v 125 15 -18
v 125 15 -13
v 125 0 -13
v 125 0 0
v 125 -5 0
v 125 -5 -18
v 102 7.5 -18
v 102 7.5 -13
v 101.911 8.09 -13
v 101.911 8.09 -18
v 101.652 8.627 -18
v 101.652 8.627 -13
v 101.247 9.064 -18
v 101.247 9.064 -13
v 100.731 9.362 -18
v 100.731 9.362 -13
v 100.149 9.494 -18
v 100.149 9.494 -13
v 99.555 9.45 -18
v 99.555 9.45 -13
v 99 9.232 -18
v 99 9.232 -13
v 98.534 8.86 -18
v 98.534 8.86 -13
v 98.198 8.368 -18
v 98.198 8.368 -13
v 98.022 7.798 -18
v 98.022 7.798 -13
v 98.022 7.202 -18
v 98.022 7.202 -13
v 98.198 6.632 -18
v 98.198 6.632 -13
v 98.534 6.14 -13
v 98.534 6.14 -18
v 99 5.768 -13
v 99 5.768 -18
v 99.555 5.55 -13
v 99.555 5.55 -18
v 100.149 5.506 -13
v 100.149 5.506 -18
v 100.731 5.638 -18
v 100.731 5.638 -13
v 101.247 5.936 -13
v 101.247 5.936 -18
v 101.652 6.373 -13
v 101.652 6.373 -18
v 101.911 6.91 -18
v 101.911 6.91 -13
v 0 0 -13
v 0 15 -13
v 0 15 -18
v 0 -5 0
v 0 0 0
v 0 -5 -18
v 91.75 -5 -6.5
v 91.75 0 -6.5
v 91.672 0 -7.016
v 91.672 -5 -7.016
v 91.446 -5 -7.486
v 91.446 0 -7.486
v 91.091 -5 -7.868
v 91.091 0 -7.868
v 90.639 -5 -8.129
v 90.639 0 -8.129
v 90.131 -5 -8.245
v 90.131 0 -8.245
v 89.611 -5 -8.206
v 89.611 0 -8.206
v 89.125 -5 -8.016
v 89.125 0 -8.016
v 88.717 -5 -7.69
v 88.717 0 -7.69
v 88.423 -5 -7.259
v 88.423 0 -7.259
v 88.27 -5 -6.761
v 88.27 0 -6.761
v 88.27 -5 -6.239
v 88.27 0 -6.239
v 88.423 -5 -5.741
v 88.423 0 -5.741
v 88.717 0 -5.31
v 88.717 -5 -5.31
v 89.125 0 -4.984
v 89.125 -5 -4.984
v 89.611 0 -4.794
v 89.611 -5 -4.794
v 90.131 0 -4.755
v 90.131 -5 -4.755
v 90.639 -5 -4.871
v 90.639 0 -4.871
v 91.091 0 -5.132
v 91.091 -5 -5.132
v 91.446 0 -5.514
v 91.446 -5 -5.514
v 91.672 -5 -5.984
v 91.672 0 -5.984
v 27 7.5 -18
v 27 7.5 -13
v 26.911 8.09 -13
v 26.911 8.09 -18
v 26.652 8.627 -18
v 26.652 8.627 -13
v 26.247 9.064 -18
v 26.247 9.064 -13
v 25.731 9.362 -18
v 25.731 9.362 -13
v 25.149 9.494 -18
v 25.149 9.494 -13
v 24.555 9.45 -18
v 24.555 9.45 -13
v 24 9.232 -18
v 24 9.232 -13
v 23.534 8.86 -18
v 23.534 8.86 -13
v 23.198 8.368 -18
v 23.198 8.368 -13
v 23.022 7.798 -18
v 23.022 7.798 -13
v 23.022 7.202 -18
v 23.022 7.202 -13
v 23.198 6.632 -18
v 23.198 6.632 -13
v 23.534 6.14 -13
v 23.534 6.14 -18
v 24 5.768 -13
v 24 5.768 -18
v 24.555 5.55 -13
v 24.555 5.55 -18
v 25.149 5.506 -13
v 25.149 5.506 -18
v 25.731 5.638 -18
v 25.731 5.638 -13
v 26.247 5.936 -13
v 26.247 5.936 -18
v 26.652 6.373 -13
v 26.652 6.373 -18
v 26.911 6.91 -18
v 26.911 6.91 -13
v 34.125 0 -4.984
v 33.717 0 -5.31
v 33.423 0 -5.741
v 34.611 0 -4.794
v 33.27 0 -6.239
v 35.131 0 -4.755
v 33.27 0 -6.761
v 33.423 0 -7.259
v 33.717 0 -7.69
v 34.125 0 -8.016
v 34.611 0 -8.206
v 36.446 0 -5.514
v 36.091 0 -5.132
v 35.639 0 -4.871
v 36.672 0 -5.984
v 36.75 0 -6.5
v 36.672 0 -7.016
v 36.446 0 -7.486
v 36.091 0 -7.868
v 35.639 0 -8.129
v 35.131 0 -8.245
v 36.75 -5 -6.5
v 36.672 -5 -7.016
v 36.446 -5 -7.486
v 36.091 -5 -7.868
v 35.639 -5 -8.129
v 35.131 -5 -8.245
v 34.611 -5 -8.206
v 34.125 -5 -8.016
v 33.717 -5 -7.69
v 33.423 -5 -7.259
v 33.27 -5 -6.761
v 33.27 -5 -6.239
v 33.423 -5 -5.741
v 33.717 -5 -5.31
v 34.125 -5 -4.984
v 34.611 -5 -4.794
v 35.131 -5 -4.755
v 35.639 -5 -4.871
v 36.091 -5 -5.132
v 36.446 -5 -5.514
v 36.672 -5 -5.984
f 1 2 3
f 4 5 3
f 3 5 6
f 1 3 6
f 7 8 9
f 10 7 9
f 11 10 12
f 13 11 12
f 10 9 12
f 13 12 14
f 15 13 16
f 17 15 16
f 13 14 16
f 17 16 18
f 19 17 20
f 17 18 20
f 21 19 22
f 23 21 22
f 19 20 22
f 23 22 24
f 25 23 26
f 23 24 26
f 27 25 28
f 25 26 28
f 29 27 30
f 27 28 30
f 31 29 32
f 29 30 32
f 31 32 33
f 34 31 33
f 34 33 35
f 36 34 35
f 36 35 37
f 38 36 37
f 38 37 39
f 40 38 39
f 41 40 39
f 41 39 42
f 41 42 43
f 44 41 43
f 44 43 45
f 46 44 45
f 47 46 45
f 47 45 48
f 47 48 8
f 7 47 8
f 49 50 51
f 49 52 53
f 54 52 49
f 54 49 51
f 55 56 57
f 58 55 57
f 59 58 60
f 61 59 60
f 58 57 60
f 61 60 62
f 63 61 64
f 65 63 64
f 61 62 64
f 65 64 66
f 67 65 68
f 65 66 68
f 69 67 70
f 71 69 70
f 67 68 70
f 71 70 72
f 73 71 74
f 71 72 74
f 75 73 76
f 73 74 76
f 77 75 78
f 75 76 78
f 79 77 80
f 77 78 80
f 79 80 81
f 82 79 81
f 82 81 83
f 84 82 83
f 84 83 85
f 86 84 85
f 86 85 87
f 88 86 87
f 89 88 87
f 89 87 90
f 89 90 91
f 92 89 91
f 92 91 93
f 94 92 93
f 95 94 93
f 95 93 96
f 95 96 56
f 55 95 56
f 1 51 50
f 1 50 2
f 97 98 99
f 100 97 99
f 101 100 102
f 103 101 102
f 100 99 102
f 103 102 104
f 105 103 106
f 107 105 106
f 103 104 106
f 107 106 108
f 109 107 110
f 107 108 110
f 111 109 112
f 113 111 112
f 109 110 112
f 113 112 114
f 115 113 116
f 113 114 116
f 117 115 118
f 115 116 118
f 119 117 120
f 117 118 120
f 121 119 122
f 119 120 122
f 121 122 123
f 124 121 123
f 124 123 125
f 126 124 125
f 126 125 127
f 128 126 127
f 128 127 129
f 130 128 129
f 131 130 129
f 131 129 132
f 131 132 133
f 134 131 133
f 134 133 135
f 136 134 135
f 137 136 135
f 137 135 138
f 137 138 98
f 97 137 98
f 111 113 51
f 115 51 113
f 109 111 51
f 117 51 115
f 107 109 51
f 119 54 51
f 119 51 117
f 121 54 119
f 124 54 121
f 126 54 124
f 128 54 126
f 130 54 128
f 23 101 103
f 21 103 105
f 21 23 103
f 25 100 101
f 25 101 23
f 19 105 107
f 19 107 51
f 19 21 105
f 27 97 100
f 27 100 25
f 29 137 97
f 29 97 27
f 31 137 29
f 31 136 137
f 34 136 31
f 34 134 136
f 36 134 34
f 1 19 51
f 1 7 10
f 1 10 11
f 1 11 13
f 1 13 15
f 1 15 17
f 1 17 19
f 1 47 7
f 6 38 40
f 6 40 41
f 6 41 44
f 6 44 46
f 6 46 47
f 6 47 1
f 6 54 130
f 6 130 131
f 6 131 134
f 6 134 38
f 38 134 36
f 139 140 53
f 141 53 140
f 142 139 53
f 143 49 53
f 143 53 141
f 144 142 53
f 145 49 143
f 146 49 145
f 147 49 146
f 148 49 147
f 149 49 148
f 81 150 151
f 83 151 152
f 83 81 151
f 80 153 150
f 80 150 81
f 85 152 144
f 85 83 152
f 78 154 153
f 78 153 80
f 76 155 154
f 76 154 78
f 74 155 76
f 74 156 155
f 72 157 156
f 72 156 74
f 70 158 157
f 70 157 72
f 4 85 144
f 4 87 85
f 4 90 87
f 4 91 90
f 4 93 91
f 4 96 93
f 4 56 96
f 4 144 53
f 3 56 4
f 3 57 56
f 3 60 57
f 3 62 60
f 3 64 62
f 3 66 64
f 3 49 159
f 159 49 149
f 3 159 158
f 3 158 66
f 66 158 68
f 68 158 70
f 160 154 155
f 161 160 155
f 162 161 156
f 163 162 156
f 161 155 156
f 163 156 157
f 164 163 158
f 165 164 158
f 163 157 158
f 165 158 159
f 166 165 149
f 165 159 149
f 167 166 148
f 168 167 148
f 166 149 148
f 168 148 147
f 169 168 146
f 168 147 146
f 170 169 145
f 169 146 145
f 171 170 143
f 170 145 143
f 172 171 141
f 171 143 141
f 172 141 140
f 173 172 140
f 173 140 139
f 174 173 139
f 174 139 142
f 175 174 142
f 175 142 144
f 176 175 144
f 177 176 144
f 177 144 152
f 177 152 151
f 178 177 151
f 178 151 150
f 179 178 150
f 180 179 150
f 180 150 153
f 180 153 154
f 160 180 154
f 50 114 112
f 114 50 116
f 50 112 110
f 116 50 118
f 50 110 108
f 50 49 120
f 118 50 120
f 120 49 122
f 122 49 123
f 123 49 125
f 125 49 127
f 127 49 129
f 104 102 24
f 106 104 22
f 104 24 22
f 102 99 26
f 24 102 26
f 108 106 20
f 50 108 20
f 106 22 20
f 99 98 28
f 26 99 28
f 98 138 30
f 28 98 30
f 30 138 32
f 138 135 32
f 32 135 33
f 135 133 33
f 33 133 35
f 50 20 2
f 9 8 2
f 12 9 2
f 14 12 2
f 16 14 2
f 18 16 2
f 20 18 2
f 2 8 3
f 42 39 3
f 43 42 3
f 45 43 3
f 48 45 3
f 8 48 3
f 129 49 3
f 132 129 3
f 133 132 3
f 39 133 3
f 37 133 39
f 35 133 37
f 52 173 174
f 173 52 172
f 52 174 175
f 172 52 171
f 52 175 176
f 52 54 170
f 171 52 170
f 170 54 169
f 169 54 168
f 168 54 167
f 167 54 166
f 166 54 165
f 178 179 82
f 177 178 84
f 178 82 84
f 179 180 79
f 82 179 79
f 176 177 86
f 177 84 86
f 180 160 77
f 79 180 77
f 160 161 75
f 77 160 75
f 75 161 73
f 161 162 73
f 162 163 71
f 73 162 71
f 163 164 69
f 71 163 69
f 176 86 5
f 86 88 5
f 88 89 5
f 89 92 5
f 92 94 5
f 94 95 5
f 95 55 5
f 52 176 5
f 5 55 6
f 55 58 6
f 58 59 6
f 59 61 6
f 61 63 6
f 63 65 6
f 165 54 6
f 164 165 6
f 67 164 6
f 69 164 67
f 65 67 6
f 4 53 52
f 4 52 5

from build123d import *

# Parameters (mm, degrees)
SKETCH1_W           = 125
SKETCH1_H           = 18
BOSS_EXTRUDE1_DEPTH = 5
SKETCH3_W           = 125
SKETCH3_H           = 5
BOSS_EXTRUDE2_DEPTH = 15
SKETCH5_R           = 2
CUT_EXTRUDE1_DEPTH  = 6
SKETCH6_R           = 1.75
CUT_EXTRUDE2_DEPTH  = 6


with BuildPart() as part:
    # Sketch1 → Boss-Extrude1 (new body)
    with BuildSketch(Plane(origin=(0, 0, 0), x_dir=(1, 0, 0), z_dir=(0, 1, 0))):
        with Locations((62.5, 9)):
            Rectangle(SKETCH1_W, SKETCH1_H)
    extrude(amount=-BOSS_EXTRUDE1_DEPTH)

    # Sketch3 → Boss-Extrude2 (add)
    with BuildSketch(Plane(origin=(0, 0, 0), x_dir=(1, 0, 0), z_dir=(0, 1, 0))):
        with Locations((62.5, 15.5)):
            Rectangle(SKETCH3_W, SKETCH3_H)
    extrude(amount=BOSS_EXTRUDE2_DEPTH)

    # Sketch5 → Cut-Extrude1 (cut, through all)
    with BuildSketch(Plane.XY.offset(-13)):
        with Locations((25, 7.5)):
            Circle(SKETCH5_R)
        with Locations((100, 7.5)):
            Circle(SKETCH5_R)
    extrude(amount=-CUT_EXTRUDE1_DEPTH, mode=Mode.SUBTRACT)

    # Sketch6 → Cut-Extrude2 (cut, through all)
    with BuildSketch(Plane(origin=(0, 0, 0), x_dir=(1, 0, 0), z_dir=(0, 1, 0))):
        with Locations((35, 6.5)):
            Circle(SKETCH6_R)
        with Locations((90, 6.5)):
            Circle(SKETCH6_R)
    extrude(amount=-CUT_EXTRUDE2_DEPTH, mode=Mode.SUBTRACT)


solid = part.part
